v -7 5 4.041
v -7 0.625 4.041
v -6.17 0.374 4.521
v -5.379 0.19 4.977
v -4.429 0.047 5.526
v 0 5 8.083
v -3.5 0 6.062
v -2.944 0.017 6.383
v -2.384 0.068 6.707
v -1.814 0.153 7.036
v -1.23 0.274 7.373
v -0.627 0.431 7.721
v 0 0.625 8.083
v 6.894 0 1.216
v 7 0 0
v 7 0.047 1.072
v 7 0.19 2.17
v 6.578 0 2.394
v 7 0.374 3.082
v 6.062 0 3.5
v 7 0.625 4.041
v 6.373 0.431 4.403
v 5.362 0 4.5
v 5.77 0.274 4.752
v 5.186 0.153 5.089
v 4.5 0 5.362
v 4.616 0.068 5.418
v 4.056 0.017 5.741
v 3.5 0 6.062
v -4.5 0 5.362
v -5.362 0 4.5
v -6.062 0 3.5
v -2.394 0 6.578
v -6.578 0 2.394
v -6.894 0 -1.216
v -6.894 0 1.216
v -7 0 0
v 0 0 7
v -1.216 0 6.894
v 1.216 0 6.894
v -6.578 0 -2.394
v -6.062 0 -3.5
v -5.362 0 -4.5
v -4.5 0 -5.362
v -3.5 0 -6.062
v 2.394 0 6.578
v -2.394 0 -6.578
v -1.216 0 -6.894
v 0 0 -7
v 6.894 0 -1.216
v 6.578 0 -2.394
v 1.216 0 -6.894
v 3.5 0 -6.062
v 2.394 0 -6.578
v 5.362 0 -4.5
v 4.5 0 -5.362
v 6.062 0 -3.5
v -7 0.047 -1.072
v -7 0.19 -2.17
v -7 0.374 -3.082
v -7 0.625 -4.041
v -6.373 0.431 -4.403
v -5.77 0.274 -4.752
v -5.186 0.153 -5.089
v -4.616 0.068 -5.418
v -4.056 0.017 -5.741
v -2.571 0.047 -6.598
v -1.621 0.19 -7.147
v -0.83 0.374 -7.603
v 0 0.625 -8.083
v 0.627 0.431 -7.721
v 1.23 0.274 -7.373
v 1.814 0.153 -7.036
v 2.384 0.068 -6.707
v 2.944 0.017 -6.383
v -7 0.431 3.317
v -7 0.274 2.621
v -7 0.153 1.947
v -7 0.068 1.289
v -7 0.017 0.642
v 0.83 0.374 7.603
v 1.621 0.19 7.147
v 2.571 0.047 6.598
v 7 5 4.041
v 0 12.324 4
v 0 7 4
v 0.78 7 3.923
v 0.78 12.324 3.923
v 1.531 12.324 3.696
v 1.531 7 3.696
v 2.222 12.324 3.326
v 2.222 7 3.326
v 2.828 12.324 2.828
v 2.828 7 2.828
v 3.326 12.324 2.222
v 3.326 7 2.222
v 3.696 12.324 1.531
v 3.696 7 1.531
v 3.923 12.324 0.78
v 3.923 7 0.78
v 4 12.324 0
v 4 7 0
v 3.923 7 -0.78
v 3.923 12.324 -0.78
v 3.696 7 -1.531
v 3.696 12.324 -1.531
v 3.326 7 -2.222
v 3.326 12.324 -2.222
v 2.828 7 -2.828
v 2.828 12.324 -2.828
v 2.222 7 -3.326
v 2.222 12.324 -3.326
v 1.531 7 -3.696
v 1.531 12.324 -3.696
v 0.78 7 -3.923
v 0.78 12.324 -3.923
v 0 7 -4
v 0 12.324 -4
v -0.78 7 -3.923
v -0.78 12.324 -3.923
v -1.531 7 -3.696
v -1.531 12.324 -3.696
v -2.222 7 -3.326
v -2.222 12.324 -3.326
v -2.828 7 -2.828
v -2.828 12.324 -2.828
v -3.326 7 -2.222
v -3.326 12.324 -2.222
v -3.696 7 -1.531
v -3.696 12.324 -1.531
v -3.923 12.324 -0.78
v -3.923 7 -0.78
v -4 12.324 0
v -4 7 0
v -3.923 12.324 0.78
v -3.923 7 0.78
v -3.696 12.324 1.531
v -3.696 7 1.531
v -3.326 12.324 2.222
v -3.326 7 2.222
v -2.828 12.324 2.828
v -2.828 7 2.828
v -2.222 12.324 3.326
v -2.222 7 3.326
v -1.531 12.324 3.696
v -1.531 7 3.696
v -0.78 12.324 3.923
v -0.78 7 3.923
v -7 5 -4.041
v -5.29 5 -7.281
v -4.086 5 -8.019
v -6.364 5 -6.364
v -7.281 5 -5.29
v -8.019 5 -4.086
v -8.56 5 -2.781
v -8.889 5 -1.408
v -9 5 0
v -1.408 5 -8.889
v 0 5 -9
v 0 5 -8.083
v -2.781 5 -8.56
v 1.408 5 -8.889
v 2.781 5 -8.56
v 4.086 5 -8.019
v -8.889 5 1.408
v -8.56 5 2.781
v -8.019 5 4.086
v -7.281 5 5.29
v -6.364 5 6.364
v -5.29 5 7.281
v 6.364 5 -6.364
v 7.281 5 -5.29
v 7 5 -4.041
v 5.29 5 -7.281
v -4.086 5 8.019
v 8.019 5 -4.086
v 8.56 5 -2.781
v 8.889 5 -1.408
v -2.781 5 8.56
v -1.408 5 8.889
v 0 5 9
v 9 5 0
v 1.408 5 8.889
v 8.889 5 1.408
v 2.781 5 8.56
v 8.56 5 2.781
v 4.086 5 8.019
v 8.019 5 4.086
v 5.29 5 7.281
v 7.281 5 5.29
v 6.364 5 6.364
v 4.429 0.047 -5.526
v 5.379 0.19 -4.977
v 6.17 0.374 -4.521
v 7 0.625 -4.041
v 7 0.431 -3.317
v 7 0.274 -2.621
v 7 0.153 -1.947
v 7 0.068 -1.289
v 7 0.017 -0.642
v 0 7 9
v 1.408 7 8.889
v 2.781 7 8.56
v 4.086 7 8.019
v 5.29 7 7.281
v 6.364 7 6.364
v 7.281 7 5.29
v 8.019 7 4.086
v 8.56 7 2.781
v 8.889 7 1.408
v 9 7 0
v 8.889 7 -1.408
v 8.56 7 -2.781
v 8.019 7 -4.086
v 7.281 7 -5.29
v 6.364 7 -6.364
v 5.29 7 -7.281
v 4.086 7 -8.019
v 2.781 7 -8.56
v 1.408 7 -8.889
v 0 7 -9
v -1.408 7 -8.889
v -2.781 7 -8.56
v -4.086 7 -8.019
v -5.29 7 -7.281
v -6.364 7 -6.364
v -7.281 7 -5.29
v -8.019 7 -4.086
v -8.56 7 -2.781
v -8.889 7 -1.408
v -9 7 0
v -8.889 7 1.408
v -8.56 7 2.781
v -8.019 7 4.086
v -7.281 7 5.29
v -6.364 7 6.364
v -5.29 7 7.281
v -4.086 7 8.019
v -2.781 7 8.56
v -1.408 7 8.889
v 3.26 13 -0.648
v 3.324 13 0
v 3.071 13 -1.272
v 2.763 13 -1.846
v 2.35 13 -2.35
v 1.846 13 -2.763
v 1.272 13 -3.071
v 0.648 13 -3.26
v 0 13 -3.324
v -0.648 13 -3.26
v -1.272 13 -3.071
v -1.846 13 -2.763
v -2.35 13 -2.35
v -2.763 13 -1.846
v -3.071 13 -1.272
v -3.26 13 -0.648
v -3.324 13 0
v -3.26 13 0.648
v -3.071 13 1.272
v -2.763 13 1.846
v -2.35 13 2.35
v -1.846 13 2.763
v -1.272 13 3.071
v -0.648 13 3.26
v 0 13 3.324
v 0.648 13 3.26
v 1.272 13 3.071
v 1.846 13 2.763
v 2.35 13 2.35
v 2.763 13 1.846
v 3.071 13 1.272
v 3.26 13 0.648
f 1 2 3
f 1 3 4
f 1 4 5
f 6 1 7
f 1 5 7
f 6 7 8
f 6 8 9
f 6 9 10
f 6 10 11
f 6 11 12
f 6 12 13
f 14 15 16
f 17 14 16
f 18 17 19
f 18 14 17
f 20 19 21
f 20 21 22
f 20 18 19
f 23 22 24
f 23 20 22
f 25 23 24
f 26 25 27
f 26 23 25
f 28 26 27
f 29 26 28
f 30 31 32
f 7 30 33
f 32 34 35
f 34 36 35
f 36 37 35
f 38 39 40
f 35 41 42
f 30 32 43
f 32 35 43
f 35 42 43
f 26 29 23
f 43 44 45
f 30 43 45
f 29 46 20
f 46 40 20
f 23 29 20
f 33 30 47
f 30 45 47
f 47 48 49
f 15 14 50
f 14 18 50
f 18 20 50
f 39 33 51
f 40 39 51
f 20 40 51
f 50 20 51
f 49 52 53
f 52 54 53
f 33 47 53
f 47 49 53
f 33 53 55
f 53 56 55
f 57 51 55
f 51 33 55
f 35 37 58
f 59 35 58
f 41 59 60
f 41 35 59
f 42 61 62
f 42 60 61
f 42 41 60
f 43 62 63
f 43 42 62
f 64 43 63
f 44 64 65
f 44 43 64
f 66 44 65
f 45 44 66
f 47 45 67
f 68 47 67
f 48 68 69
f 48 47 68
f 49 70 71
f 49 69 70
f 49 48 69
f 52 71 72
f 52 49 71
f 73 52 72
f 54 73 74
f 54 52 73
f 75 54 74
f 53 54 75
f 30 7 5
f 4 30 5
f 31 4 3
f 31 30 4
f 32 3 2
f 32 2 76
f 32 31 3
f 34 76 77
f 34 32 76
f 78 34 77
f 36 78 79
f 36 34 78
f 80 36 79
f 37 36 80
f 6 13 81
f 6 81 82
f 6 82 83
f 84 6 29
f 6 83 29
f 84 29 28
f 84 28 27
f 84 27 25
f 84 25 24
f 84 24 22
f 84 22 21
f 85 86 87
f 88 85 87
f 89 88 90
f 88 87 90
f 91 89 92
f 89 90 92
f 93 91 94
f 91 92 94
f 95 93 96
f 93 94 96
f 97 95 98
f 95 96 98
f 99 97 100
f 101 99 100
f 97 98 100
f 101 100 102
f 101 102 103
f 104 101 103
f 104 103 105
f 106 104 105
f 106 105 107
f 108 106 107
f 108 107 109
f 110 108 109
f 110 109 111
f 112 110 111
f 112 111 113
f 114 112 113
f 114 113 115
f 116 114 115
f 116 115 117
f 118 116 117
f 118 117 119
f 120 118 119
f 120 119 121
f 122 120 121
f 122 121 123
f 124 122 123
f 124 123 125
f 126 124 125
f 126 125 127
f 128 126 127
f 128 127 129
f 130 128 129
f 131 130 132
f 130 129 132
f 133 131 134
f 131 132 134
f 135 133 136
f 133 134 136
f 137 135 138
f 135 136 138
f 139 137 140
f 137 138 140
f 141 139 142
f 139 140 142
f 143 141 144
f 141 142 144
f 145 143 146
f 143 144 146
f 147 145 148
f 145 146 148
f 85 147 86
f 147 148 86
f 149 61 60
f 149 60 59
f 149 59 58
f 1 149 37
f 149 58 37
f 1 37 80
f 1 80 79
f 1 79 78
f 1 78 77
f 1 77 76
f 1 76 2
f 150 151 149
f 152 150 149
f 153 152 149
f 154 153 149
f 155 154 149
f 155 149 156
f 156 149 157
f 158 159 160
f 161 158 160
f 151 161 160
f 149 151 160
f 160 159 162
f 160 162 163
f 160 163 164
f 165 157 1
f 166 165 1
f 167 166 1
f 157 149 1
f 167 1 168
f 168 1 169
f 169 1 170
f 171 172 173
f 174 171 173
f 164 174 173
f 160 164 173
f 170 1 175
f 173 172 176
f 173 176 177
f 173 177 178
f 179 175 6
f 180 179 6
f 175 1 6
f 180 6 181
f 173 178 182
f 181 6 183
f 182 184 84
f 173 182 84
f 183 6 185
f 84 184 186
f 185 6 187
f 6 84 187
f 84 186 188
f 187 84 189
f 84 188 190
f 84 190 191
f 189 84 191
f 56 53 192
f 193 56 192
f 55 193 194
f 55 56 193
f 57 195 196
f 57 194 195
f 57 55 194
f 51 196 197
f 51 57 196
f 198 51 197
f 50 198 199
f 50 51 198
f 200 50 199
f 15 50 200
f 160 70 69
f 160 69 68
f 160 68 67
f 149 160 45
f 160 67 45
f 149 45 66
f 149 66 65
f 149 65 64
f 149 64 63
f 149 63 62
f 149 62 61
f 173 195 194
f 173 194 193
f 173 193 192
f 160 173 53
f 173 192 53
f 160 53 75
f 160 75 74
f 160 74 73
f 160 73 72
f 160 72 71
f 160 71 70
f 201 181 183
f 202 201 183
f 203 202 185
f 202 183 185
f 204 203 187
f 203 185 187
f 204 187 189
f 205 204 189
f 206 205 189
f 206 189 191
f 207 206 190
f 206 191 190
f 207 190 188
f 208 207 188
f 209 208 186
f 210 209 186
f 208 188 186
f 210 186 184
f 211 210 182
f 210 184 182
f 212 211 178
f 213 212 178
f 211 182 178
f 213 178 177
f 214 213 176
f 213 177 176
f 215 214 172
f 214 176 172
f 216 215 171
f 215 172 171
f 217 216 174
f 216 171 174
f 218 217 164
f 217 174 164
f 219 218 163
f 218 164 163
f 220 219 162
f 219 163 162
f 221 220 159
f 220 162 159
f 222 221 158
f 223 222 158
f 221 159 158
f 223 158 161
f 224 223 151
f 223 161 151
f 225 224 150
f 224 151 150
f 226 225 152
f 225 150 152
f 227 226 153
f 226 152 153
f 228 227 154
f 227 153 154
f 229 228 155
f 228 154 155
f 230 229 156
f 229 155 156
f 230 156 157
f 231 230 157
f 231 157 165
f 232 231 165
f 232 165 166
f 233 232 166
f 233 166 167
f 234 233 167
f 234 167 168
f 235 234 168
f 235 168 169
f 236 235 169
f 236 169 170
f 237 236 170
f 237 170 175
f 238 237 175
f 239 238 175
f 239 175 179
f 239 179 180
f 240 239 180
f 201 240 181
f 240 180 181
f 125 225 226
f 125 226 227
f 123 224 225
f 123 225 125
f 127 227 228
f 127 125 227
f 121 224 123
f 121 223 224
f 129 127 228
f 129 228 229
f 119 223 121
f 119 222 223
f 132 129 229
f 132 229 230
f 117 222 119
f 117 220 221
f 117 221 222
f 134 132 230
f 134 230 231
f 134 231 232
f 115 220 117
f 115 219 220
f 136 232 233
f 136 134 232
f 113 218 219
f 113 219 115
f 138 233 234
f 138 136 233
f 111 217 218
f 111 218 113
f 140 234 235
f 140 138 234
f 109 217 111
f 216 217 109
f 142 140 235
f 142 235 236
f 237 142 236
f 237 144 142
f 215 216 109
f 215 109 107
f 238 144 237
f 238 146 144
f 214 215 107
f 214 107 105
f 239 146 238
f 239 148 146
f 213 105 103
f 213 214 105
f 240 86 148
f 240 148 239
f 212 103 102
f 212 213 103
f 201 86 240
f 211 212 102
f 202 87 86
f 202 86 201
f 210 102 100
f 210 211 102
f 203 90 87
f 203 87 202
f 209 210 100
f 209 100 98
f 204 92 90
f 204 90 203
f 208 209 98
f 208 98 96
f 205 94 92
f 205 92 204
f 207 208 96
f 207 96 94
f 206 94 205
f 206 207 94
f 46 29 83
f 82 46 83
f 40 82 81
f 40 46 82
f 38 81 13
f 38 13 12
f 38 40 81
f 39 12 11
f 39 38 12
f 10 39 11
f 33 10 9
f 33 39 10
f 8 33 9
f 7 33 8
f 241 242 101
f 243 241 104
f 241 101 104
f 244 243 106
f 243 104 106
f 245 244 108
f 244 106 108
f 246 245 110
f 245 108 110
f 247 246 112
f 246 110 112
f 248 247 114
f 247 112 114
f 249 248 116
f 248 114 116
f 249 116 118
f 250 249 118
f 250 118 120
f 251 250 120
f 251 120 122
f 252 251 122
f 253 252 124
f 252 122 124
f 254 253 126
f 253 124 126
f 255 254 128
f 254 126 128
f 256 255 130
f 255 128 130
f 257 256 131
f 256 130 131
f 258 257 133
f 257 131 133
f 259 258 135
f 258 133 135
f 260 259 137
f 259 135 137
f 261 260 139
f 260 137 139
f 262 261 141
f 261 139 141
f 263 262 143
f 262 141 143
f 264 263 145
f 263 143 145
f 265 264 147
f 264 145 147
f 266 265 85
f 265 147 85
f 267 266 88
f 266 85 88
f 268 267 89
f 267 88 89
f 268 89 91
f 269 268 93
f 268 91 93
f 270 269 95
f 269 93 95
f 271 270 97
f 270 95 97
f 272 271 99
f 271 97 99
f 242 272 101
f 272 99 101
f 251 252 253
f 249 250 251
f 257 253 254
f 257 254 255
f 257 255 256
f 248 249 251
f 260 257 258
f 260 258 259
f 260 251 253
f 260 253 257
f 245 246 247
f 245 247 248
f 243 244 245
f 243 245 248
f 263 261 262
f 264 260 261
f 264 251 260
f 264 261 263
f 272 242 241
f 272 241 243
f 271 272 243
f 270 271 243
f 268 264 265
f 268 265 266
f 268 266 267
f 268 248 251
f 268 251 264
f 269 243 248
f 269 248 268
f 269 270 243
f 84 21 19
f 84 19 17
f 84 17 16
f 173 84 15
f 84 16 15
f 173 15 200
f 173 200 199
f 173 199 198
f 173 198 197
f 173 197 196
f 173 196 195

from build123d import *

# Parameters (mm, degrees)
EXTRUDE_1_DEPTH     = 5
SKETCH_3_OUTSIDE_W  = 64.746
SKETCH_3_OUTSIDE_H  = 66.912
SKETCH_3_OUTSIDE_R  = 7
CUT_EXTRUDE_1_DEPTH = 12.80395414
CUT_EXTRUDE_1_DRAFT = -60
SKETCH_4_R          = 9
EXTRUDE_2_DEPTH     = 2
SKETCH_5_R          = 4
EXTRUDE_3_DEPTH     = 6


# Read off the part's stored shape, not the designer's step: M8 机械螺纹 螺柱1
with BuildPart() as part:
    # 草图1 → 凸台-拉伸1 (new body)
    with BuildSketch(Plane(origin=(0, 0, 0), x_dir=(1, 0, 0), z_dir=(0, 1, 0))):
        Polygon((7, -4.041451884), (7, 4.041451884), (0, 8.082903769), (-7, 4.041451884), (-7, -4.041451884), (0, -8.082903769), align=None)
    extrude(amount=EXTRUDE_1_DEPTH)


with BuildPart() as cut_extrude_1_tool:
    # 草图3 outside → 切除-拉伸1 (with draft: the straight prism first)
    with BuildSketch(Plane.XZ):
        Rectangle(SKETCH_3_OUTSIDE_W, SKETCH_3_OUTSIDE_H)
        Circle(SKETCH_3_OUTSIDE_R, mode=Mode.SUBTRACT)
    extrude(amount=-CUT_EXTRUDE_1_DEPTH)
    # 切除-拉伸1: the draft: its side faces are tilted about the plane it starts from
    cut_extrude_1_sides = [cut_extrude_1_tool.faces().sort_by_distance(p)[0] for p in [
        (0, 6.40197707, -33.456),
        (32.373, 6.40197707, 0),
        (0, 6.40197707, 33.456),
        (-32.373, 6.40197707, 0),
        (-7, 6.40197707, 0),
    ]]
    draft(cut_extrude_1_sides, Plane.XZ, CUT_EXTRUDE_1_DRAFT)


with BuildPart() as part_1:
    add(part.part)

    # 切除-拉伸1: cut by cut_extrude_1_tool
    add(cut_extrude_1_tool.part, mode=Mode.SUBTRACT)

    # 草图4 → 凸台-拉伸2 (add)
    with BuildSketch(Plane(origin=(0, 5, 0), x_dir=(1, 0, 0), z_dir=(0, 1, 0))):
        with Locations(Location((0, 0, 0), (0, 0, 270))):
            Circle(SKETCH_4_R)
    extrude(amount=EXTRUDE_2_DEPTH)

    # 草图5 → 凸台-拉伸3 (add)
    with BuildSketch(Plane(origin=(0, 7, 0), x_dir=(1, 0, 0), z_dir=(0, 1, 0))):
        with Locations(Location((0, 0, 0), (0, 0, 270))):
            Circle(SKETCH_5_R)
    extrude(amount=EXTRUDE_3_DEPTH)

    # M8 机械螺纹 螺柱1 outline → M8 机械螺纹 螺柱1 (revolve, cut)
    with BuildSketch(Plane.XY):
        Polygon((4, 13), (3.3235, 13), (4, 12.3235), align=None)
    revolve(axis=Axis((0, 0, 0), (0, 1, 0)), mode=Mode.SUBTRACT)


solid = part_1.part
